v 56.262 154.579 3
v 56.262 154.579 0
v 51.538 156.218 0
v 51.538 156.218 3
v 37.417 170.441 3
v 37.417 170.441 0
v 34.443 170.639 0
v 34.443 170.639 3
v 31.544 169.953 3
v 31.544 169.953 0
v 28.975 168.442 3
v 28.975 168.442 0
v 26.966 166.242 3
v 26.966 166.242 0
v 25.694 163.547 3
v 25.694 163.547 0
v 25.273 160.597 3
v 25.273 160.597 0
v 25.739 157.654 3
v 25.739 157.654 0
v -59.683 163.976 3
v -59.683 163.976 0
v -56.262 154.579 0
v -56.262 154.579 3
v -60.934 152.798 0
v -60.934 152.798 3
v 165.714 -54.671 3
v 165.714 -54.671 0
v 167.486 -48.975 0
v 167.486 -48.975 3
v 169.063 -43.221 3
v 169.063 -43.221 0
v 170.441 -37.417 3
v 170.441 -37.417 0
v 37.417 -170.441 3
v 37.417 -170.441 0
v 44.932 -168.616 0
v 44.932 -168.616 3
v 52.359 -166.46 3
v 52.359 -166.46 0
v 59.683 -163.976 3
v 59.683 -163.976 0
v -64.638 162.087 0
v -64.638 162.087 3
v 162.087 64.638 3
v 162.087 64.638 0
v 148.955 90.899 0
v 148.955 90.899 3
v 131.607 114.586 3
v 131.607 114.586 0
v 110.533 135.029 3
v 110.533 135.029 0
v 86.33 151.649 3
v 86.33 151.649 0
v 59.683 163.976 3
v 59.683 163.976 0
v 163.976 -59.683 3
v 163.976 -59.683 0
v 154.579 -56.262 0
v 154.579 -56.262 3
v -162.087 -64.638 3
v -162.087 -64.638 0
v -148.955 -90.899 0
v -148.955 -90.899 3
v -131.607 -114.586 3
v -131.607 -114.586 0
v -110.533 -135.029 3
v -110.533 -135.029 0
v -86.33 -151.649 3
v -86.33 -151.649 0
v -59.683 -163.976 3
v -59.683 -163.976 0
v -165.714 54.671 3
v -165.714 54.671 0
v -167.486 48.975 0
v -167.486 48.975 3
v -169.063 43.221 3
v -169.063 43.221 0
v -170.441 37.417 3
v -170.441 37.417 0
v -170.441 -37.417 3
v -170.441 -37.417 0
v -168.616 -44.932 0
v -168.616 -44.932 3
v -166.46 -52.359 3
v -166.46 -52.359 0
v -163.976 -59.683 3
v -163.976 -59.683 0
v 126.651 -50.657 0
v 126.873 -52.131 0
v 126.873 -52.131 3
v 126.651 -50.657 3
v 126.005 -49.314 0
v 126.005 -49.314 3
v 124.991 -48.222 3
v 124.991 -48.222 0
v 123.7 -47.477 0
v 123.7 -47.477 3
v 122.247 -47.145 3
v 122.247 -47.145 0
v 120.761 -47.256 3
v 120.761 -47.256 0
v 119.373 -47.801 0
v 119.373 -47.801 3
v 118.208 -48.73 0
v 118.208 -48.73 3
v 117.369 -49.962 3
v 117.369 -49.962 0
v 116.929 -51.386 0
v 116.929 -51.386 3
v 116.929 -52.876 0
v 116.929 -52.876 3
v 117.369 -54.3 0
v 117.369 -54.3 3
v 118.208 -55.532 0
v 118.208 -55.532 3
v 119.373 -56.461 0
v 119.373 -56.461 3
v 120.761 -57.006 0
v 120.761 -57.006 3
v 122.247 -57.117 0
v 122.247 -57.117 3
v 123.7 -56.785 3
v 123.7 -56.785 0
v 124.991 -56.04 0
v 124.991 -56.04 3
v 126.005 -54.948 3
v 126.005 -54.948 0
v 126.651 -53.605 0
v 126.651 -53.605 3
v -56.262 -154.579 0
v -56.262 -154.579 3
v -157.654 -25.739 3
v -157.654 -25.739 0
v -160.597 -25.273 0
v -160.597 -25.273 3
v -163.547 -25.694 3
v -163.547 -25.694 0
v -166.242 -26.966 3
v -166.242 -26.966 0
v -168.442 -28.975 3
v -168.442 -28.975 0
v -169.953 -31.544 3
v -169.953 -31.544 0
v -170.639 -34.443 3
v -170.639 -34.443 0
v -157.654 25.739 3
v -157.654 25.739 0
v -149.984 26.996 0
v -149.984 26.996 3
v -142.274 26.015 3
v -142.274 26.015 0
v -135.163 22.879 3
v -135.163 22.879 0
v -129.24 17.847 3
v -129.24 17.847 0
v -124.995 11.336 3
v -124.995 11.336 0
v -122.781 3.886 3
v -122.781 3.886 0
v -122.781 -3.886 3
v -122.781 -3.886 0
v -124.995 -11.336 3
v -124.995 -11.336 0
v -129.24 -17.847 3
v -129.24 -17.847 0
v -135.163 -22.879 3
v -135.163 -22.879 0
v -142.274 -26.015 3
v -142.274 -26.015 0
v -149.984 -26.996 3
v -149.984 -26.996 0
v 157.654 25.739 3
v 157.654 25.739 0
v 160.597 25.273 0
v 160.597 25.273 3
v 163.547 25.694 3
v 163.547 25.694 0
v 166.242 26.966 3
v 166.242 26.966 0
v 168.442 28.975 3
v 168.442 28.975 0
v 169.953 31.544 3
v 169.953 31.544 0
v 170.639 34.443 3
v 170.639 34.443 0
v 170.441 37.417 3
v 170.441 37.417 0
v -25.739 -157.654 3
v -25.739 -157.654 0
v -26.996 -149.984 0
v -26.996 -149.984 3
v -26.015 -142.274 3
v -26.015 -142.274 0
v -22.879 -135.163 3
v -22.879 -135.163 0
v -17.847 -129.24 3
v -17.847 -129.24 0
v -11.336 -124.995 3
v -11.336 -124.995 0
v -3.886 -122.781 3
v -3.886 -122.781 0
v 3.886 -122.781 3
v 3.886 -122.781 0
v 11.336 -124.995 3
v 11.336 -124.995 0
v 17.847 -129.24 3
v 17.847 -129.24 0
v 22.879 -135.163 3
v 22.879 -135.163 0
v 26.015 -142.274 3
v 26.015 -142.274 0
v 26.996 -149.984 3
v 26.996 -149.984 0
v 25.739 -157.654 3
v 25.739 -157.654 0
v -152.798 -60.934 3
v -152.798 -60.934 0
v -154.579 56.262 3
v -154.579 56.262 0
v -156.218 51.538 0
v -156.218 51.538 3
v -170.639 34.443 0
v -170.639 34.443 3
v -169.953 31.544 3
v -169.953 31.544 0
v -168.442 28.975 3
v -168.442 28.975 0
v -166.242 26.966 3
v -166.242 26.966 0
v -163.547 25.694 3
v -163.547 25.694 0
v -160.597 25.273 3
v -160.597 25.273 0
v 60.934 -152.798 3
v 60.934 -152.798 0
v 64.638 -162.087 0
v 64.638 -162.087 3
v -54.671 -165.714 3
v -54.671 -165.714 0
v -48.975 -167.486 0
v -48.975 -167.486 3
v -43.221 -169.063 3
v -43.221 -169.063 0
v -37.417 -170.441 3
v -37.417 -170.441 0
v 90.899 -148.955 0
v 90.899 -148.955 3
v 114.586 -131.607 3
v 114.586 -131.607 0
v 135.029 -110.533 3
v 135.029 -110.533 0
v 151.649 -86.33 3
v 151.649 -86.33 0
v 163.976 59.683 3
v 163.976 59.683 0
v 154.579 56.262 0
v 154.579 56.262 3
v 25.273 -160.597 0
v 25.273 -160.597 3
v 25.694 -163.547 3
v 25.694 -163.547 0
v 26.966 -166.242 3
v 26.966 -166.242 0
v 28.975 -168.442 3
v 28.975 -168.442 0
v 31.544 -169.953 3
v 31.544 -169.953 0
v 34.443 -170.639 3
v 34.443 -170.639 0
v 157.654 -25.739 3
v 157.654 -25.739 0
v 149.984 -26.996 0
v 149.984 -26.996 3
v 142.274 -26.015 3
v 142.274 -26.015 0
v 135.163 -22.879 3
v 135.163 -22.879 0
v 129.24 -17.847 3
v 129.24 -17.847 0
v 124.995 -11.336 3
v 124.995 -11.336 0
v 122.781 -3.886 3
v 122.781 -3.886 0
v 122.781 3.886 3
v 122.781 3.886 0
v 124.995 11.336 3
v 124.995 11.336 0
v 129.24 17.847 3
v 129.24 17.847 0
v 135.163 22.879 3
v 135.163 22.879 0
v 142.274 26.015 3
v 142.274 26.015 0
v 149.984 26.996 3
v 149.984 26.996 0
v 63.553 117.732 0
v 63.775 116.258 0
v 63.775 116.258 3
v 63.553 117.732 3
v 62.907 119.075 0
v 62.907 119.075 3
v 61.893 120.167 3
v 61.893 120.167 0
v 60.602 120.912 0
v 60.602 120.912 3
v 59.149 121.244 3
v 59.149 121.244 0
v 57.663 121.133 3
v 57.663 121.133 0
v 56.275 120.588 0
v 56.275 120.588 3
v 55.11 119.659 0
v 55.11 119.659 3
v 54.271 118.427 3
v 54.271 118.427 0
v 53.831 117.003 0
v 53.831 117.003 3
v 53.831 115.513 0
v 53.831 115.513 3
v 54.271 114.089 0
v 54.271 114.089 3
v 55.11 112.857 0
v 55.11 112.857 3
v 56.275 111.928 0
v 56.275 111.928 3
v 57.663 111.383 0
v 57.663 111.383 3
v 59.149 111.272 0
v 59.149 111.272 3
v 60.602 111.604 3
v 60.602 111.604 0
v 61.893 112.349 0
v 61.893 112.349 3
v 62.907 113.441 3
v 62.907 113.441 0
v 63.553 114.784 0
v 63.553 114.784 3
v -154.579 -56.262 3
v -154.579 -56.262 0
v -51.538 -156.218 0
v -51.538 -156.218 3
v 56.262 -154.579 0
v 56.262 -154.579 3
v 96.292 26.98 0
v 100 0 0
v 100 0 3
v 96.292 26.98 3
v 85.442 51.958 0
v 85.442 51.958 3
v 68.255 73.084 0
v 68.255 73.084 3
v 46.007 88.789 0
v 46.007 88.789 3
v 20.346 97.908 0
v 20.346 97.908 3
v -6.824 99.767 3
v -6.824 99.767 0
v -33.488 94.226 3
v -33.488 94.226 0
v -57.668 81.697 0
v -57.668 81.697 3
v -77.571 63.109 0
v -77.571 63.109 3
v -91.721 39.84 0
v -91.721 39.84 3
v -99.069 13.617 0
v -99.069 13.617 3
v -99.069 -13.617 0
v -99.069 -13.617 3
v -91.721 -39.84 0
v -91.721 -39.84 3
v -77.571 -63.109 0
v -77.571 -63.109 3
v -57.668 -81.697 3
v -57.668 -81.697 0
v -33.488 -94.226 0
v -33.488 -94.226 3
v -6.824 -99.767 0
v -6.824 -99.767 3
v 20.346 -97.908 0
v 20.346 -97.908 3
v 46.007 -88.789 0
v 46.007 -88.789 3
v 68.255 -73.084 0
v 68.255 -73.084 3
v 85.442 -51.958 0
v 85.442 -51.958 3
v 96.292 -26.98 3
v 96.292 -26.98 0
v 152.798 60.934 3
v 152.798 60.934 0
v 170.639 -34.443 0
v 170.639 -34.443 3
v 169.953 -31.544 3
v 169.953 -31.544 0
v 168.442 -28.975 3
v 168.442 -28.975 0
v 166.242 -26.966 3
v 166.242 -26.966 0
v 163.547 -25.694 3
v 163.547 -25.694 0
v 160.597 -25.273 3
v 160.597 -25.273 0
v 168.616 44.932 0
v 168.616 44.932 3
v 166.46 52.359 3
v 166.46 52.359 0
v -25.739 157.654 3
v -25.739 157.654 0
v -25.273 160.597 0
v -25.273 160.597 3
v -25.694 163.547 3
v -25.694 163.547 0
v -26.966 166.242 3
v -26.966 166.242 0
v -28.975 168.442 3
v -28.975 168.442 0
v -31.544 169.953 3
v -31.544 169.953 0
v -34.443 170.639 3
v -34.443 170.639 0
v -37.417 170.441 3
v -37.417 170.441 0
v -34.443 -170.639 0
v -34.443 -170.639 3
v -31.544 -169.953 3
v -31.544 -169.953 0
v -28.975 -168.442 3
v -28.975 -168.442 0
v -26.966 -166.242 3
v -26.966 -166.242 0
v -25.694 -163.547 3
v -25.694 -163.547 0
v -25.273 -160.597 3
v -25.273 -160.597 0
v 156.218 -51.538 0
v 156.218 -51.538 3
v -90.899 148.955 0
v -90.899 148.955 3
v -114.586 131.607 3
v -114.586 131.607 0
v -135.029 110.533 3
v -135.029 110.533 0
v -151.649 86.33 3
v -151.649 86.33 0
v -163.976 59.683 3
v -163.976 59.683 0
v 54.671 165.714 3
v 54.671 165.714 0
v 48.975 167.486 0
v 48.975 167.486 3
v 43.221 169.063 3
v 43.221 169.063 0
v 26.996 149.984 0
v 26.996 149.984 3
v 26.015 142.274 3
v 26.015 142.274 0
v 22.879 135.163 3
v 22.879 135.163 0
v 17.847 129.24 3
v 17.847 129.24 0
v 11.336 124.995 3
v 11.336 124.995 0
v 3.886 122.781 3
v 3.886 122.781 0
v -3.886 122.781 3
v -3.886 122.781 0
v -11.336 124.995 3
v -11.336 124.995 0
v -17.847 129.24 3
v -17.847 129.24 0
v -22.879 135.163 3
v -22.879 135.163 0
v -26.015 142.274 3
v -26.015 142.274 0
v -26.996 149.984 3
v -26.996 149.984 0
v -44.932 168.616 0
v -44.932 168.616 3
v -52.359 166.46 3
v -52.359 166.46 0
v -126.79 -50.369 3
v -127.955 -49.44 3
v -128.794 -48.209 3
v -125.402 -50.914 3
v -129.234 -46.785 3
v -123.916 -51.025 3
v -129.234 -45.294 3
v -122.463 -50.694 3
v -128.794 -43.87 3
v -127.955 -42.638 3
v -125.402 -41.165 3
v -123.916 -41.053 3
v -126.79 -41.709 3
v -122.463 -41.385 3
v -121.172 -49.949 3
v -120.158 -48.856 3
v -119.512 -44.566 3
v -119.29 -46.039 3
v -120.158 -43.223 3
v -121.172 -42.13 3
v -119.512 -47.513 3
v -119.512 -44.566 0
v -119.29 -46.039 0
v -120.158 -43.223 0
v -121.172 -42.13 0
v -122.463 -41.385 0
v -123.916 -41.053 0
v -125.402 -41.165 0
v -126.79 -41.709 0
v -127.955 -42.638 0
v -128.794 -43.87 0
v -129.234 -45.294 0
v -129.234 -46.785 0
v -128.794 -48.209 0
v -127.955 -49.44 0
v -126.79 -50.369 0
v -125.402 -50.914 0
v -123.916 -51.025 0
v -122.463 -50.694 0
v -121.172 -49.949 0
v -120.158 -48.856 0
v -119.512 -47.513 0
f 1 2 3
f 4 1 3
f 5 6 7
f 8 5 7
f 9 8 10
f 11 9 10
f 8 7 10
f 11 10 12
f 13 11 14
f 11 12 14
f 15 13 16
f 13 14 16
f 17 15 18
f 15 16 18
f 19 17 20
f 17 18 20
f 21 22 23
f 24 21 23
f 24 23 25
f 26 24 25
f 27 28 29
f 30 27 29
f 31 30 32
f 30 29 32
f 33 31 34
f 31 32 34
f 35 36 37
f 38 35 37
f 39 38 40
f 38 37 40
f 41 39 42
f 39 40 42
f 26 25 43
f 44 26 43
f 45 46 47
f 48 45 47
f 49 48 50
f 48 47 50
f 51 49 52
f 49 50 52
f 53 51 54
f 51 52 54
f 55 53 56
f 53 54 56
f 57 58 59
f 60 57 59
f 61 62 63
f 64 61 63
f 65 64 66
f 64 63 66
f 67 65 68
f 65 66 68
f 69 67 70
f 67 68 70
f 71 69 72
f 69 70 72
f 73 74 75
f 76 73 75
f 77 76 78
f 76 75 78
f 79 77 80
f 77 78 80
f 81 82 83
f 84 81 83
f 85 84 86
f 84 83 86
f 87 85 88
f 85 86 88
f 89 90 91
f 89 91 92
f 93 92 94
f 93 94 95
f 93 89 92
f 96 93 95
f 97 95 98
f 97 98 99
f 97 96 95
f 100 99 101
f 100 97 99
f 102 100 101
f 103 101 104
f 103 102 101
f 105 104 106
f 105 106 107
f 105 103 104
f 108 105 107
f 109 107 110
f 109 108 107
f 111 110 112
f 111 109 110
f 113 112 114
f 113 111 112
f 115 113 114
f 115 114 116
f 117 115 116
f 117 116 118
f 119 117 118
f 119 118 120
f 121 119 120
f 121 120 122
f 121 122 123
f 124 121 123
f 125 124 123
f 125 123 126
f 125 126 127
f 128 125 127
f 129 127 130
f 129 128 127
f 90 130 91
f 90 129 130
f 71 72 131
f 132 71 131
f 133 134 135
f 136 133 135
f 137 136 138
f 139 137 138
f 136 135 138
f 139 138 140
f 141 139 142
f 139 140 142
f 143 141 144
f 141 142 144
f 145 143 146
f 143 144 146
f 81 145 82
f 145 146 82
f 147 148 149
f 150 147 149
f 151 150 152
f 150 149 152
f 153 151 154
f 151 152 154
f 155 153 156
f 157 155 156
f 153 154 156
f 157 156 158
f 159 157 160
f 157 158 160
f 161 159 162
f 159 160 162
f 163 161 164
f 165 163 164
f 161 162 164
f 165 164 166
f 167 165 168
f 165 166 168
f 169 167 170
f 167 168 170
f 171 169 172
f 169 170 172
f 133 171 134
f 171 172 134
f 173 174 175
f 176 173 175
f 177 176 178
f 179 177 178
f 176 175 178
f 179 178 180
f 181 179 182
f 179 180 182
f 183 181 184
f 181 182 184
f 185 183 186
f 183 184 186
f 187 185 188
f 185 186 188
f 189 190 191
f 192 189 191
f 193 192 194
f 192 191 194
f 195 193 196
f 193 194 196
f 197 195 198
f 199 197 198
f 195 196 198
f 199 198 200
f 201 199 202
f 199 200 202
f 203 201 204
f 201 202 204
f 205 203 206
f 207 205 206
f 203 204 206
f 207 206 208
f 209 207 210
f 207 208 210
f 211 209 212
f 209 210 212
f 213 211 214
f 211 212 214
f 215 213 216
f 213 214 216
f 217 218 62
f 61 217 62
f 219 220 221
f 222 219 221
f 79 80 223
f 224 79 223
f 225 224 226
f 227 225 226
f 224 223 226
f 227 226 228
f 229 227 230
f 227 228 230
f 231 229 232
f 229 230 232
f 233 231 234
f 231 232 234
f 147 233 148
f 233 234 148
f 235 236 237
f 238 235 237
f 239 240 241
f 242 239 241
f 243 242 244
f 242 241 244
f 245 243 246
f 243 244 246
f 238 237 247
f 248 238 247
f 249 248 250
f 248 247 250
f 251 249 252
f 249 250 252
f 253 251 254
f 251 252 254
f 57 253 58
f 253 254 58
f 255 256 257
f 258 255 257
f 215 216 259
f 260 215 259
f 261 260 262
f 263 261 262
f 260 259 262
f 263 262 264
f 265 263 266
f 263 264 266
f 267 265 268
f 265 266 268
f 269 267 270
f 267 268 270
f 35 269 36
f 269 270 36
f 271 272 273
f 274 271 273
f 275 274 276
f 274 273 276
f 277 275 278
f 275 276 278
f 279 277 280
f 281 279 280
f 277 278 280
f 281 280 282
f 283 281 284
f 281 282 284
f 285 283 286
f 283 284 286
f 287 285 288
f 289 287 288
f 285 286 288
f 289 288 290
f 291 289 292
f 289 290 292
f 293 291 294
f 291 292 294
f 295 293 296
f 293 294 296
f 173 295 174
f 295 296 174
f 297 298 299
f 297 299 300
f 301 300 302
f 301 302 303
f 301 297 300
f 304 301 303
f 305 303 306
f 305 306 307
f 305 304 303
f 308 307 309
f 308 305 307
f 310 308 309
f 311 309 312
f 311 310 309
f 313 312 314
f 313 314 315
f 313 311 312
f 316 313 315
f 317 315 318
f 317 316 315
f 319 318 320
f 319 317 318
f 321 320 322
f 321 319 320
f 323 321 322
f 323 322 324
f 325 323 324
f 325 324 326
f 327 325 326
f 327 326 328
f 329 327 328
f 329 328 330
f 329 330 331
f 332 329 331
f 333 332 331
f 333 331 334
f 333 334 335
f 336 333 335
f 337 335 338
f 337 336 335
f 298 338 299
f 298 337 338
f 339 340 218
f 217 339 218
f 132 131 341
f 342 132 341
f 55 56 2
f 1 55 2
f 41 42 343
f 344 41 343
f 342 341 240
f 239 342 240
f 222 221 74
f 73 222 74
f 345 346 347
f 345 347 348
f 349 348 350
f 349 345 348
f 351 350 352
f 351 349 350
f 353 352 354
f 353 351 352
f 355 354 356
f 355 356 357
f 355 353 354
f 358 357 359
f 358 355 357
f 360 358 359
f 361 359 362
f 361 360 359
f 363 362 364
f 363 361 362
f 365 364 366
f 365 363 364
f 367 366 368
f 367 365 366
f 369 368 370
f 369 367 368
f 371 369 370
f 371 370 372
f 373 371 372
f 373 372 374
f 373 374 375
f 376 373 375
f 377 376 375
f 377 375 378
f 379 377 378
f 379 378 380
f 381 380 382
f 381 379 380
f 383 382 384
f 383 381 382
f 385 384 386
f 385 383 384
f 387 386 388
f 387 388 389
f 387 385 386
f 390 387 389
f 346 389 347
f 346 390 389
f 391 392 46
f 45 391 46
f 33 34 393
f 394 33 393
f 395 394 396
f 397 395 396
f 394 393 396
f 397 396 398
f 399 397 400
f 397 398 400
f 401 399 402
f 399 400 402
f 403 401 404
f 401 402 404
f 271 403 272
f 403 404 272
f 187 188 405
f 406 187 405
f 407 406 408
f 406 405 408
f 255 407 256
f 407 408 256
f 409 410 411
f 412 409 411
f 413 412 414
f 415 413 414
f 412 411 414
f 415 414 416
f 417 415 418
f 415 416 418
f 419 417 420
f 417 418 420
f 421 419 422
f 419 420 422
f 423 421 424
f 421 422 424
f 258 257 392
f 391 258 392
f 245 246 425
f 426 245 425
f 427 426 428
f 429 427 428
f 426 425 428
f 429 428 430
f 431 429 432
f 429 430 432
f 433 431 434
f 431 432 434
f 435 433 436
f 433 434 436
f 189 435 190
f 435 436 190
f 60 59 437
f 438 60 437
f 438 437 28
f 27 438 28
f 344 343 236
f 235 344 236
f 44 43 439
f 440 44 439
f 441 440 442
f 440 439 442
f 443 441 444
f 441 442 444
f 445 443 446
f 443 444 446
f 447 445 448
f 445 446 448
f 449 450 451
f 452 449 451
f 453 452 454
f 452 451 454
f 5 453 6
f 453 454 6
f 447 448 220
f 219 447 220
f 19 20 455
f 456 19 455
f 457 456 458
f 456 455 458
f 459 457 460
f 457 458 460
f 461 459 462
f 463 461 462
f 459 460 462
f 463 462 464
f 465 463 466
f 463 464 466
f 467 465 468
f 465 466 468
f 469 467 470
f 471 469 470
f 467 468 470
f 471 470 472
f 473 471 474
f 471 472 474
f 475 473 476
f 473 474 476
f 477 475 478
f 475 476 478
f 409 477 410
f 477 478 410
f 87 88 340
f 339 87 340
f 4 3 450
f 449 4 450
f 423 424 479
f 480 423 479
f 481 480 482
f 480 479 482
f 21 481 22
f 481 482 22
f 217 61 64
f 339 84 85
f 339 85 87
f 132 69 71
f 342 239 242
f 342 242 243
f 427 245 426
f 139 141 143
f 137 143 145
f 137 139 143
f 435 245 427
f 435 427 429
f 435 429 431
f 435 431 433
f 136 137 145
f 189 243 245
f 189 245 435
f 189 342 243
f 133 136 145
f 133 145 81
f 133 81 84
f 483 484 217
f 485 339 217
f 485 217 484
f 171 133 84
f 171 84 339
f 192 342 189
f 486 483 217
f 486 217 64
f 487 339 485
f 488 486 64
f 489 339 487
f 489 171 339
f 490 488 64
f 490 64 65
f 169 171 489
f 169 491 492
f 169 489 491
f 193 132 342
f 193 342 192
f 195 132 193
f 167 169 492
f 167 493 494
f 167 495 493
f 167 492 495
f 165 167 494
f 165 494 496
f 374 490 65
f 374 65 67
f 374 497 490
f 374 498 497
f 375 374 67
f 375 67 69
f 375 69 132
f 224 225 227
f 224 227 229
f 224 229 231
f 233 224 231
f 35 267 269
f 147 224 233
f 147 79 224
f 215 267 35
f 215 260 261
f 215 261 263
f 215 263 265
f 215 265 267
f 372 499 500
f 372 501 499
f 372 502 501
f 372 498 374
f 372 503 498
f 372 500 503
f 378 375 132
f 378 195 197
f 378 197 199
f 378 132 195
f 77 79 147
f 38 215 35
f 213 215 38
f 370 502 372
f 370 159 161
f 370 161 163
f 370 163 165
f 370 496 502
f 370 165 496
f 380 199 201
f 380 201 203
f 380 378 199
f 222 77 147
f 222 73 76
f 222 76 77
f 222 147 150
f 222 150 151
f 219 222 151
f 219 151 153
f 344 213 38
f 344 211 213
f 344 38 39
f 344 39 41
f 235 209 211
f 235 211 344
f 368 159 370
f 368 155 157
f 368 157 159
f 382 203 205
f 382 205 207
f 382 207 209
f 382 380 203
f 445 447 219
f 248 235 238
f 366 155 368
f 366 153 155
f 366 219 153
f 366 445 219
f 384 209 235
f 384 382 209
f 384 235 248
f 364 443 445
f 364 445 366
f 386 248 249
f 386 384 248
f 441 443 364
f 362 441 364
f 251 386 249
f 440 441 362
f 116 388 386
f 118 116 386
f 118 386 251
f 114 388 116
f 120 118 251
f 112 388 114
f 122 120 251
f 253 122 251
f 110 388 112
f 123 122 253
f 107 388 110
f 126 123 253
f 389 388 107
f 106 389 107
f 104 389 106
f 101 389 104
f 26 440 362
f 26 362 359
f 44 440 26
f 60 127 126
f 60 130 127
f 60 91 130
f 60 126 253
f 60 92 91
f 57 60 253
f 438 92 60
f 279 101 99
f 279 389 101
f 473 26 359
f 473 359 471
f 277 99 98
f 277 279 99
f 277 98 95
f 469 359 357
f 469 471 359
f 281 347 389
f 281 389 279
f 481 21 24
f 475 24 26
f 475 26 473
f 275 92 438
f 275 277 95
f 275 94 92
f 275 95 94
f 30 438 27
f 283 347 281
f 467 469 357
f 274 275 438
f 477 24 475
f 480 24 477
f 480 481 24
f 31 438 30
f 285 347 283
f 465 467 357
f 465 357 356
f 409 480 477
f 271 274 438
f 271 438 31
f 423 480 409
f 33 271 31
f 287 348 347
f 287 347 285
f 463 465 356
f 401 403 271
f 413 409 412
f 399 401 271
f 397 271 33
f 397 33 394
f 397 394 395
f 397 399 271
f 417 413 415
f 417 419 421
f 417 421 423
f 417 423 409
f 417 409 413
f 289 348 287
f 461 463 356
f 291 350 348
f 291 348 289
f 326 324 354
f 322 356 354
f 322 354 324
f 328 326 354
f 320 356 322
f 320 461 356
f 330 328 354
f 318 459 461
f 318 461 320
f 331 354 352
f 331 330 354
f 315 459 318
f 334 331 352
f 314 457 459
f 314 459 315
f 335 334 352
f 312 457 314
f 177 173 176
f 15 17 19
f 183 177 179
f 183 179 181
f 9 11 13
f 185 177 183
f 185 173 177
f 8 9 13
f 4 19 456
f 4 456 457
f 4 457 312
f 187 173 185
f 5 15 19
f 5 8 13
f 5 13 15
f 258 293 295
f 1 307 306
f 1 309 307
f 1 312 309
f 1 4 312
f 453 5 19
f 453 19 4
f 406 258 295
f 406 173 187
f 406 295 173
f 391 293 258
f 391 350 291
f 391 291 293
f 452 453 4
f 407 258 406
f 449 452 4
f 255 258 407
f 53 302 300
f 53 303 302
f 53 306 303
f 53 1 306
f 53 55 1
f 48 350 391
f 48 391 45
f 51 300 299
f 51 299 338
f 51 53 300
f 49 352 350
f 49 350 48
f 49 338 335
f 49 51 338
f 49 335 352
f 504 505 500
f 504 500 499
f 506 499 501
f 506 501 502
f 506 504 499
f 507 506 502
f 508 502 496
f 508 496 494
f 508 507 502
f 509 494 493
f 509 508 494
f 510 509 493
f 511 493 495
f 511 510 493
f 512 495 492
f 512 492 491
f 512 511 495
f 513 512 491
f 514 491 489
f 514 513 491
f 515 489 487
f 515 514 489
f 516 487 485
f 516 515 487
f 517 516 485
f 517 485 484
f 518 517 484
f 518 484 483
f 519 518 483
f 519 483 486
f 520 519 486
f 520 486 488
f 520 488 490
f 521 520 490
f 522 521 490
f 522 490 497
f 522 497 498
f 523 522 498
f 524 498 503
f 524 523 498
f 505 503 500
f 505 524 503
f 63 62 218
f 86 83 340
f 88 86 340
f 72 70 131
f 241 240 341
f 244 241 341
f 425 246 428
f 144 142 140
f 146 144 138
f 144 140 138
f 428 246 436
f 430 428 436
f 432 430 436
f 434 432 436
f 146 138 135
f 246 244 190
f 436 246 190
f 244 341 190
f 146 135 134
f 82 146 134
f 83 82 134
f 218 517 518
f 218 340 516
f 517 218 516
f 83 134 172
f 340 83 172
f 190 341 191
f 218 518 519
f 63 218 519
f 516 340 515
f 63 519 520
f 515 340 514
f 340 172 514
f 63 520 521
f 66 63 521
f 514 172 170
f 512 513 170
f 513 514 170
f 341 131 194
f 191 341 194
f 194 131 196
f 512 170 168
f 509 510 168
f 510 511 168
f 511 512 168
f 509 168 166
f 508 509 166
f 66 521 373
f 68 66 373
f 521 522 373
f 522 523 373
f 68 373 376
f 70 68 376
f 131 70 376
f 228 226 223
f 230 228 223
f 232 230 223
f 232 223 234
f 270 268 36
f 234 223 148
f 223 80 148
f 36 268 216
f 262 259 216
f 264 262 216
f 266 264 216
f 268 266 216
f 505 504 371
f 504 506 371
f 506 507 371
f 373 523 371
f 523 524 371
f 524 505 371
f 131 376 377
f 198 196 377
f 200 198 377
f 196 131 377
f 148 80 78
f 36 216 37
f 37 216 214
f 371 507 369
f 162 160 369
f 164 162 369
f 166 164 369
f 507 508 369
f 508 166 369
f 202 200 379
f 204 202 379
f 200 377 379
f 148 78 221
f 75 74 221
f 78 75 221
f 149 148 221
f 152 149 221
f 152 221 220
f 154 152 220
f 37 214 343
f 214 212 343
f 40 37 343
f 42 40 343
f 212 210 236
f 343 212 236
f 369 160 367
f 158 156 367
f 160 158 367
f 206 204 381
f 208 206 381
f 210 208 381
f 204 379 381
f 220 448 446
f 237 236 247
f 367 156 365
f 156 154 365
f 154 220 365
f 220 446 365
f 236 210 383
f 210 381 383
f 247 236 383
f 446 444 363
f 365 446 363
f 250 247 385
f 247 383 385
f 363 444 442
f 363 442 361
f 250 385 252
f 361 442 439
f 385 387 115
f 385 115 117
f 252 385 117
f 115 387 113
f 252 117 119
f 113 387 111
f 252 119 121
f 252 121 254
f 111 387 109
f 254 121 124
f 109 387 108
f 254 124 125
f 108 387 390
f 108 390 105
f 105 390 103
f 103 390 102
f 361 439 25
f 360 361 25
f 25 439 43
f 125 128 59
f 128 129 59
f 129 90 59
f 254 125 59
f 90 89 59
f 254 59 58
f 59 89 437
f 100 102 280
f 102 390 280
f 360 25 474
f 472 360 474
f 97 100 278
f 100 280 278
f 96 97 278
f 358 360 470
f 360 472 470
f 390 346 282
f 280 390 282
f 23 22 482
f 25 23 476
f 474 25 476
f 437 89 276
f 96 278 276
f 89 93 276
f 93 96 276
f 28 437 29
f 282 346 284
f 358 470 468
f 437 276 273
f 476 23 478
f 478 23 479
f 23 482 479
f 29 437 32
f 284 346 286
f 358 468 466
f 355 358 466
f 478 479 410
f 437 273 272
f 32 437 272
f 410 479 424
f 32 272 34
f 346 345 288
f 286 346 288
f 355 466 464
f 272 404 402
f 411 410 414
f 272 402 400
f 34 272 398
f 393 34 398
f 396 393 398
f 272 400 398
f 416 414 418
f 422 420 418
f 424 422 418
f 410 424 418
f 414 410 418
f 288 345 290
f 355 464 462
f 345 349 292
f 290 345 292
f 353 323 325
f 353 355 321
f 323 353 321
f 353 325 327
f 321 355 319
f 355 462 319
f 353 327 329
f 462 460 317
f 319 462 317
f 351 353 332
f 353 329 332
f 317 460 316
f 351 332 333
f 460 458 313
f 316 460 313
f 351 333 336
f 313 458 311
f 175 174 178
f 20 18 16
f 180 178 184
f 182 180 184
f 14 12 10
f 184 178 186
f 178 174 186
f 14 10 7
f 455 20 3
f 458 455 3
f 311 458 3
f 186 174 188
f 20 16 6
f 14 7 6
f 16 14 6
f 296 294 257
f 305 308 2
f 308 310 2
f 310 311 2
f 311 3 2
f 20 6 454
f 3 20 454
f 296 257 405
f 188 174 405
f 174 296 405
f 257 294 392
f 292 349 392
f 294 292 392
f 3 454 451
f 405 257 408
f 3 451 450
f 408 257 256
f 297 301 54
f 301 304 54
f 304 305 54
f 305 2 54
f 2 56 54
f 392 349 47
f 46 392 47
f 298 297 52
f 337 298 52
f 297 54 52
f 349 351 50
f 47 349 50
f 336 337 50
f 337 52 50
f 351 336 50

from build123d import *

# Parameters (mm, degrees)
SKETCH1_R           = 5
SKETCH1_R_2         = 100
BOSS_EXTRUDE1_DEPTH = 3


with BuildPart() as part:
    # Sketch1 → Boss-Extrude1 (new body)
    with BuildSketch(Plane.XY):
        with BuildLine():
            Line((-56.262313577, -154.579436119), (-51.538403725, -156.217934123))
            Line((-51.538403725, -156.217934123), (-54.671437386, -165.714465072))
            ThreePointArc((-54.671437386, -165.714465072), (-46.10465637, -168.299170114), (-37.416640882, -170.441324171))
            ThreePointArc((-37.416640882, -170.441324171), (-27.888102395, -167.417194297), (-25.739334079, -157.653936545))
            ThreePointArc((-25.739334079, -157.653936545), (0, -122.5), (25.739334079, -157.653936545))
            ThreePointArc((25.739334079, -157.653936545), (27.888102395, -167.417194297), (37.416640882, -170.441324171))
            ThreePointArc((37.416640882, -170.441324171), (48.657069904, -167.579054623), (59.68251501, -163.976362327))
            Line((59.68251501, -163.976362327), (56.262313577, -154.579436119))
            Line((56.262313577, -154.579436119), (60.934244684, -152.798127687))
            Line((60.934244684, -152.798127687), (64.638454088, -162.086767668))
            ThreePointArc((64.638454088, -162.086767668), (125.251113016, -121.500653037), (163.976362327, -59.68251501))
            Line((163.976362327, -59.68251501), (154.579436119, -56.262313577))
            Line((154.579436119, -56.262313577), (156.217934123, -51.538403725))
            Line((156.217934123, -51.538403725), (165.714465072, -54.671437386))
            ThreePointArc((165.714465072, -54.671437386), (168.299170114, -46.10465637), (170.441324171, -37.416640882))
            ThreePointArc((170.441324171, -37.416640882), (167.417194297, -27.888102395), (157.653936545, -25.739334079))
            ThreePointArc((157.653936545, -25.739334079), (122.5, 0), (157.653936545, 25.739334079))
            ThreePointArc((157.653936545, 25.739334079), (167.417194297, 27.888102395), (170.441324171, 37.416640882))
            ThreePointArc((170.441324171, 37.416640882), (167.579054623, 48.657069904), (163.976362327, 59.68251501))
            Line((163.976362327, 59.68251501), (154.579436119, 56.262313577))
            Line((154.579436119, 56.262313577), (152.798127687, 60.934244684))
            Line((152.798127687, 60.934244684), (162.086767668, 64.638454088))
            ThreePointArc((162.086767668, 64.638454088), (121.500653037, 125.251113016), (59.68251501, 163.976362327))
            Line((59.68251501, 163.976362327), (56.262313577, 154.579436119))
            Line((56.262313577, 154.579436119), (51.538403725, 156.217934123))
            Line((51.538403725, 156.217934123), (54.671437386, 165.714465072))
            ThreePointArc((54.671437386, 165.714465072), (46.10465637, 168.299170114), (37.416640882, 170.441324171))
            ThreePointArc((37.416640882, 170.441324171), (27.888102395, 167.417194297), (25.739334079, 157.653936545))
            ThreePointArc((25.739334079, 157.653936545), (0, 122.5), (-25.739334079, 157.653936545))
            ThreePointArc((-25.739334079, 157.653936545), (-27.888102395, 167.417194297), (-37.416640882, 170.441324171))
            ThreePointArc((-37.416640882, 170.441324171), (-48.657069904, 167.579054623), (-59.68251501, 163.976362327))
            Line((-59.68251501, 163.976362327), (-56.262313577, 154.579436119))
            Line((-56.262313577, 154.579436119), (-60.934244684, 152.798127687))
            Line((-60.934244684, 152.798127687), (-64.638454088, 162.086767668))
            ThreePointArc((-64.638454088, 162.086767668), (-125.251113016, 121.500653037), (-163.976362327, 59.68251501))
            Line((-163.976362327, 59.68251501), (-154.579436119, 56.262313577))
            Line((-154.579436119, 56.262313577), (-156.217934123, 51.538403725))
            Line((-156.217934123, 51.538403725), (-165.714465072, 54.671437386))
            ThreePointArc((-165.714465072, 54.671437386), (-168.299170114, 46.10465637), (-170.441324171, 37.416640882))
            ThreePointArc((-170.441324171, 37.416640882), (-167.417194297, 27.888102395), (-157.653936545, 25.739334079))
            ThreePointArc((-157.653936545, 25.739334079), (-122.5, 0), (-157.653936545, -25.739334079))
            ThreePointArc((-157.653936545, -25.739334079), (-167.417194297, -27.888102395), (-170.441324171, -37.416640882))
            ThreePointArc((-170.441324171, -37.416640882), (-167.579054623, -48.657069904), (-163.976362327, -59.68251501))
            Line((-163.976362327, -59.68251501), (-154.579436119, -56.262313577))
            Line((-154.579436119, -56.262313577), (-152.798127687, -60.934244684))
            Line((-152.798127687, -60.934244684), (-162.086767668, -64.638454088))
            ThreePointArc((-162.086767668, -64.638454088), (-121.500653037, -125.251113016), (-59.68251501, -163.976362327))
            Line((-59.68251501, -163.976362327), (-56.262313577, -154.579436119))
        make_face()
        with Locations((121.873399663, -52.131018514)):
            Circle(SKETCH1_R, mode=Mode.SUBTRACT)
        with Locations((58.775444452, 116.257983948)):
            Circle(SKETCH1_R, mode=Mode.SUBTRACT)
        with Locations((-124.289525039, -46.039349088)):
            Circle(SKETCH1_R, mode=Mode.SUBTRACT)
        Circle(SKETCH1_R_2, mode=Mode.SUBTRACT)
    extrude(amount=BOSS_EXTRUDE1_DEPTH)


solid = part.part
